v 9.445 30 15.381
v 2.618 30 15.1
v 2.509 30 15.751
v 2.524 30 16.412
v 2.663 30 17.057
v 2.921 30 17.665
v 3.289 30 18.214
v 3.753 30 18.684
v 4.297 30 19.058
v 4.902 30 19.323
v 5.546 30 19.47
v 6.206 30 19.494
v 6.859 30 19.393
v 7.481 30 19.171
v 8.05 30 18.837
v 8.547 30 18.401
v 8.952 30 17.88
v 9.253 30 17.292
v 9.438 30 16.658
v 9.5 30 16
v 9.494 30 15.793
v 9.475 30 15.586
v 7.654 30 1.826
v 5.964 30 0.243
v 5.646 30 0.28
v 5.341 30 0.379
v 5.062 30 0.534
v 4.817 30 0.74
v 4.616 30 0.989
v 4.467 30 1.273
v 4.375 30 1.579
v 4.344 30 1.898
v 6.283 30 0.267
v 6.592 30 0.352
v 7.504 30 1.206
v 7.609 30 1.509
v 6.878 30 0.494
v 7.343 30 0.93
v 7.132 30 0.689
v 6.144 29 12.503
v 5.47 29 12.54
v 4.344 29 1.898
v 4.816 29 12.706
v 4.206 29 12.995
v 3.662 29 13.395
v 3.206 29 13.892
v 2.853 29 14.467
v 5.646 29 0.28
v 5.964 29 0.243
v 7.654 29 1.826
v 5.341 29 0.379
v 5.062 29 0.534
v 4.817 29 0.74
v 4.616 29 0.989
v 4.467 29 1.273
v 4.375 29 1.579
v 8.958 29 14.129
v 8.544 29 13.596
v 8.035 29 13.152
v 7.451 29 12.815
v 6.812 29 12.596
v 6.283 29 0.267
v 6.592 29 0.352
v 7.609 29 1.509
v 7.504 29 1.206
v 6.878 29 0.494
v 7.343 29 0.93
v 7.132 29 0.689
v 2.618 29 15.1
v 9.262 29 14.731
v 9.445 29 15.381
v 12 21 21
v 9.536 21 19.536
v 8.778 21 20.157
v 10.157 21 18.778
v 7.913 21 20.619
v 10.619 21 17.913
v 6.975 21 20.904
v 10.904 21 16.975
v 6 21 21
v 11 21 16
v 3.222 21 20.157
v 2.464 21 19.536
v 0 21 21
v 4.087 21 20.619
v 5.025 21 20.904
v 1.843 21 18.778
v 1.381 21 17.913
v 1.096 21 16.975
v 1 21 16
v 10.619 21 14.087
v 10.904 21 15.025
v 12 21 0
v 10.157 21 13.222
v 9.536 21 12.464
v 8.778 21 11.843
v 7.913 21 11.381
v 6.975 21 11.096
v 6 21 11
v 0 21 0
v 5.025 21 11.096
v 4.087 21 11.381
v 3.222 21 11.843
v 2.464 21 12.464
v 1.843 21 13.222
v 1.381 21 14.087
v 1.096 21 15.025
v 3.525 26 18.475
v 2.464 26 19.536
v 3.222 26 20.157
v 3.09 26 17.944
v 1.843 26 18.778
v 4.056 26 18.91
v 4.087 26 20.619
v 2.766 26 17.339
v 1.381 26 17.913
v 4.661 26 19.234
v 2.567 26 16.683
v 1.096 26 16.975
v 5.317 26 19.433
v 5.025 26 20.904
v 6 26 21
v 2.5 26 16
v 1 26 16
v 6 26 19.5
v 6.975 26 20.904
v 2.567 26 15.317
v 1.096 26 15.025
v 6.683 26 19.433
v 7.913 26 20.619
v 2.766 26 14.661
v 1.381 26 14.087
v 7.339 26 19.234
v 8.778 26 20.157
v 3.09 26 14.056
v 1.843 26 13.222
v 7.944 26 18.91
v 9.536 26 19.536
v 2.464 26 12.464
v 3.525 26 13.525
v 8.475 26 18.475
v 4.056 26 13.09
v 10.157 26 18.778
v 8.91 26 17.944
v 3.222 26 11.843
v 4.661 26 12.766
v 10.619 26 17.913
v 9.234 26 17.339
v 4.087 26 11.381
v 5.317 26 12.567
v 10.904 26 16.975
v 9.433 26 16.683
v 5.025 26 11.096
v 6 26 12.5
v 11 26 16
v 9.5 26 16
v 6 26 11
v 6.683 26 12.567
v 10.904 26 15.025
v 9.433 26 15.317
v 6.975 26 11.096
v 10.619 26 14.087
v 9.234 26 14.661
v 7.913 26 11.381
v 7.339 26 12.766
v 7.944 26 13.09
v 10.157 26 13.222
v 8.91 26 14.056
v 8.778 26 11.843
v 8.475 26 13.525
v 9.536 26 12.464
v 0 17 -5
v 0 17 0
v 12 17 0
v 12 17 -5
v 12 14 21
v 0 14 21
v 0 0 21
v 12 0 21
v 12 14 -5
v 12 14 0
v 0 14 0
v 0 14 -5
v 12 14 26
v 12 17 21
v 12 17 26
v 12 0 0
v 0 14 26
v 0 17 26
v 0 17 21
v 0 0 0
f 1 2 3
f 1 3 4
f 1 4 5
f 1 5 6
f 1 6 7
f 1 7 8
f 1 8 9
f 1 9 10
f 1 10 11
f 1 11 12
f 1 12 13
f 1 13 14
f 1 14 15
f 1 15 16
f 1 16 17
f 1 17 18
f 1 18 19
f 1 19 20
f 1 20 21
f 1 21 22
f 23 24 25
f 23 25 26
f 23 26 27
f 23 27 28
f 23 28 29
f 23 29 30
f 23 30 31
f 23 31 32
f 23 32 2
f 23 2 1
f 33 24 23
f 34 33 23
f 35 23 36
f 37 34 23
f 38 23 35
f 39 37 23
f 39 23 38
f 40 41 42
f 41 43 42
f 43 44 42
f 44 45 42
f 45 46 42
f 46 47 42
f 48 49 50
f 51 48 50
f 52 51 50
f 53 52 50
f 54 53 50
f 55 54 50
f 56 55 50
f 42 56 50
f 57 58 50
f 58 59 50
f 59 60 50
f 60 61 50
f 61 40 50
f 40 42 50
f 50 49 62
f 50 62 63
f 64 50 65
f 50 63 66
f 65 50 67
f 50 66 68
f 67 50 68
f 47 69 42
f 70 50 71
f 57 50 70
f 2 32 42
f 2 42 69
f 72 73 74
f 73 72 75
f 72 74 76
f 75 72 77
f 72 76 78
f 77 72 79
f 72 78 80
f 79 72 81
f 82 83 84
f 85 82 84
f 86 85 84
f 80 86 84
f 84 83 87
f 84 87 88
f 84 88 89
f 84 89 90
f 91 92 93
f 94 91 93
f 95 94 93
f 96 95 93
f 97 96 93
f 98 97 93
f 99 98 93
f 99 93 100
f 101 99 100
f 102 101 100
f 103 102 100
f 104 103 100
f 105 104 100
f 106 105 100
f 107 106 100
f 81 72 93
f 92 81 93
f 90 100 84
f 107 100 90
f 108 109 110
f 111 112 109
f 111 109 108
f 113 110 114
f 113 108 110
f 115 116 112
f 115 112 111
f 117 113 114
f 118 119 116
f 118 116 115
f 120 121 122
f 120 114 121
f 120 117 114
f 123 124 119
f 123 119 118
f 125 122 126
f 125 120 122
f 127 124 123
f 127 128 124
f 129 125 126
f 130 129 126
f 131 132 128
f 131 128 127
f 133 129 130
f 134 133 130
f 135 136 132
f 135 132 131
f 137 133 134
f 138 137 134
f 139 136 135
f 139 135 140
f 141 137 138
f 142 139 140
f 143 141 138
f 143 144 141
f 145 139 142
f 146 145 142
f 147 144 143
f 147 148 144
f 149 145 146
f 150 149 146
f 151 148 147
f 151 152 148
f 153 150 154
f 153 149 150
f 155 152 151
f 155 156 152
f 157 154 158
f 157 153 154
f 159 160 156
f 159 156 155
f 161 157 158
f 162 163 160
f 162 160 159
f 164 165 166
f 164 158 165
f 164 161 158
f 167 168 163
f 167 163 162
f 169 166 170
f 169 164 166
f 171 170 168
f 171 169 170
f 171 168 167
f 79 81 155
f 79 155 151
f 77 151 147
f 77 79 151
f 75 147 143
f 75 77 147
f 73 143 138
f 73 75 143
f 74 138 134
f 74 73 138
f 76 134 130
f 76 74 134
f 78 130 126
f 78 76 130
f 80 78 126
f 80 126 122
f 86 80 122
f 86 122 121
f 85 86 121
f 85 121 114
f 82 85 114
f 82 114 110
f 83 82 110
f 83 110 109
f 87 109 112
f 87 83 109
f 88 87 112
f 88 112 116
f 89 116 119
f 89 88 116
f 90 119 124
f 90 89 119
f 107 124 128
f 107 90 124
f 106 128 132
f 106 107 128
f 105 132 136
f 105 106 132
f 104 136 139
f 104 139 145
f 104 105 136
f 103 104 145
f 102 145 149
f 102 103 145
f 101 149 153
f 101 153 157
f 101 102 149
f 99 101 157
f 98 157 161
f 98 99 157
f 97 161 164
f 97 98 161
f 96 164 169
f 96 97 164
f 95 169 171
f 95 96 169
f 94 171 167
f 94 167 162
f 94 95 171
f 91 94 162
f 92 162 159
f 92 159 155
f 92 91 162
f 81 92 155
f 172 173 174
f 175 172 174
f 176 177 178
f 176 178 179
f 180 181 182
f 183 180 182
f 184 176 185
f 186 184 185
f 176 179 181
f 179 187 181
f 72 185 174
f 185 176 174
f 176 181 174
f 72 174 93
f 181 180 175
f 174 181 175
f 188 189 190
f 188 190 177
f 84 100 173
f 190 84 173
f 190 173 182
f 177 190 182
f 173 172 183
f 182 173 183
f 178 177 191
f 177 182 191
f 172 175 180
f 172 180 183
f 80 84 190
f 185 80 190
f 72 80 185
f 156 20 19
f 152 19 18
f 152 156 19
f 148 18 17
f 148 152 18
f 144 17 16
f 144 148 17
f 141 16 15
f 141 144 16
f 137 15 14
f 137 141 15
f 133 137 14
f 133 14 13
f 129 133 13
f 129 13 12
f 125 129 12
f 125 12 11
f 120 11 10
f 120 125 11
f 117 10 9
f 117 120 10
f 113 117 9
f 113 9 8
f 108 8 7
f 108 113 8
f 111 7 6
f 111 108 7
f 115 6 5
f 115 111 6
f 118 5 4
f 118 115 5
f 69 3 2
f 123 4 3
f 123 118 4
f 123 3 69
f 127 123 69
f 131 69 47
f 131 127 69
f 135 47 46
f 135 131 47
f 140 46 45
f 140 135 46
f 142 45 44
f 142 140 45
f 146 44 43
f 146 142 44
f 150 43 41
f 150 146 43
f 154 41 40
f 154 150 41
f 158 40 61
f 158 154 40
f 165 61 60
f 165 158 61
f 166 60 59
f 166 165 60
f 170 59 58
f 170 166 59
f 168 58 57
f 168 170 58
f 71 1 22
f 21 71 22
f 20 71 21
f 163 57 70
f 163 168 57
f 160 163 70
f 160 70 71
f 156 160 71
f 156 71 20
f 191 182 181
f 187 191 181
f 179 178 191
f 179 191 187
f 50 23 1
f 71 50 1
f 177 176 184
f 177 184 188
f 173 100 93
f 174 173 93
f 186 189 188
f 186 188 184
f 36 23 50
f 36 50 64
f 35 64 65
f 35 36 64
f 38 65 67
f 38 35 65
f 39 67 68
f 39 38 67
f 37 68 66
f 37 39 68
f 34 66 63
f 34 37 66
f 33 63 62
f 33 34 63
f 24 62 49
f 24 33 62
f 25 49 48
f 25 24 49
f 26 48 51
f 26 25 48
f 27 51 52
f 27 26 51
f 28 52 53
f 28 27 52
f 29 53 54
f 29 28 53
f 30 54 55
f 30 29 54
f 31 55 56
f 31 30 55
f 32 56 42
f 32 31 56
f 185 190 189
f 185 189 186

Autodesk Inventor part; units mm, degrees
ref_plane "YZ Plane" through (0, 0, 0) normal (1, 0, 0) x (0, 1, 0)
ref_plane "XZ Plane" through (0, 0, 0) normal (0, 1, 0) x (-1, 0, 0)
ref_plane "XY Plane" through (0, 0, 0) normal (0, 0, 1) x (1, 0, 0)
sketch "Szkic1" plane through (0, 0, 0) normal (0, 0, 1) x (1, 0, 0)
  line L0 (0, 0) -> (12, 0)
  line L1 (12, 0) -> (12, 21)
  line L2 (12, 21) -> (0, 21)
  line L3 (0, 21) -> (0, 0)
  dimension "d0" = 12
  dimension "d1" = 21
extrude "Wyciągnięcie proste1" add sketch "Szkic1" along normal blind 21
sketch "Szkic2" plane through (0, 0, 21) normal (0, 0, 1) x (1, 0, 0)
  line L0 (12, 0) -> (12, 21) projected
  line L1 (0, 17) -> (12, 17)
  line L2 (12, 17) -> (12, 14)
  line L3 (12, 14) -> (0, 14)
  line L4 (0, 14) -> (0, 17)
  line L5 (0, 17) -> (0, 14)
  line L6 (0, 21) -> (0, 0) projected
  dimension "d4" = 17
  dimension "d5" = 3
  dimension "d6" = 12
extrude "Wyciągnięcie proste2" add sketch "Szkic2" along normal blind 5
sketch "Szkic3" plane through (0, 0, 0) normal (0, 0, -1) x (-1, 0, 0)
  line L0 (0, 17) -> (0, 14) projected
  line L1 (-12, 14) -> (0, 14)
  line L2 (0, 14) -> (0, 17)
  line L3 (0, 17) -> (-12, 17) projected
  line L4 (0, 17) -> (-12, 17)
  line L5 (-12, 14) -> (-12, 17) projected
  line L6 (-12, 17) -> (-12, 14)
  point P0 (0, 0)
  point P1 (-12, 0)
extrude "Wyciągnięcie proste3" add sketch "Szkic3" along normal blind 5
sketch "Szkic4" plane through (0, 21, 0) normal (0, 1, 0) x (1, 0, 0)
  line L0 (12, -21) -> (0, -21) projected
  circle A0 centre (6, -16) radius 5
  point P0 (0, 0)
  dimension "d12" = 10
  dimension "d13" = 7.8102
extrude "Wyciągnięcie proste4" add sketch "Szkic4" along normal blind 5
sketch "Szkic5" plane through (6, 26, 16) normal (0, 1, 0) x (1, 0, 0)
  circle A0 centre (0, 0) radius 3.5
  point P0 (-6, 16)
  dimension "d16" = 7
extrude "Wyciągnięcie proste5" add sketch "Szkic5" along normal blind 4
sketch "Szkic6" plane through (6, 30, 16) normal (0, 1, 0) x (1, 0, 0)
  arc A0 (1.654, 14.1744) -> (-1.6556, 14.1022) centre (0, 14.1022) ccw
  line L0 (-1.6556, 14.1022) -> (-3.5, 0)
  circle A1 centre (0, 0) radius 3.5 projected
  line L1 (1.654, 14.1744) -> (3.5266, 0)
  point P0 (-6, 16)
  point P1 (-3.3823, 0.9001)
  point P2 (3.4448, 0.6189)
  dimension "d19" = 1.6556
  dimension "d20" = 14.977
  dimension "d21" = 3.4962
  dimension "d22" = 3.4704
  dimension "d23" = 7.349
  dimension "d24" = 6.9673
  dimension "d25" = 3.2723
  dimension "d26" = 1.6493
extrude "Wyciągnięcie proste6" add sketch "Szkic6" against normal blind 1 contours L1 A1 L0 A0
properties part number "serwo"
